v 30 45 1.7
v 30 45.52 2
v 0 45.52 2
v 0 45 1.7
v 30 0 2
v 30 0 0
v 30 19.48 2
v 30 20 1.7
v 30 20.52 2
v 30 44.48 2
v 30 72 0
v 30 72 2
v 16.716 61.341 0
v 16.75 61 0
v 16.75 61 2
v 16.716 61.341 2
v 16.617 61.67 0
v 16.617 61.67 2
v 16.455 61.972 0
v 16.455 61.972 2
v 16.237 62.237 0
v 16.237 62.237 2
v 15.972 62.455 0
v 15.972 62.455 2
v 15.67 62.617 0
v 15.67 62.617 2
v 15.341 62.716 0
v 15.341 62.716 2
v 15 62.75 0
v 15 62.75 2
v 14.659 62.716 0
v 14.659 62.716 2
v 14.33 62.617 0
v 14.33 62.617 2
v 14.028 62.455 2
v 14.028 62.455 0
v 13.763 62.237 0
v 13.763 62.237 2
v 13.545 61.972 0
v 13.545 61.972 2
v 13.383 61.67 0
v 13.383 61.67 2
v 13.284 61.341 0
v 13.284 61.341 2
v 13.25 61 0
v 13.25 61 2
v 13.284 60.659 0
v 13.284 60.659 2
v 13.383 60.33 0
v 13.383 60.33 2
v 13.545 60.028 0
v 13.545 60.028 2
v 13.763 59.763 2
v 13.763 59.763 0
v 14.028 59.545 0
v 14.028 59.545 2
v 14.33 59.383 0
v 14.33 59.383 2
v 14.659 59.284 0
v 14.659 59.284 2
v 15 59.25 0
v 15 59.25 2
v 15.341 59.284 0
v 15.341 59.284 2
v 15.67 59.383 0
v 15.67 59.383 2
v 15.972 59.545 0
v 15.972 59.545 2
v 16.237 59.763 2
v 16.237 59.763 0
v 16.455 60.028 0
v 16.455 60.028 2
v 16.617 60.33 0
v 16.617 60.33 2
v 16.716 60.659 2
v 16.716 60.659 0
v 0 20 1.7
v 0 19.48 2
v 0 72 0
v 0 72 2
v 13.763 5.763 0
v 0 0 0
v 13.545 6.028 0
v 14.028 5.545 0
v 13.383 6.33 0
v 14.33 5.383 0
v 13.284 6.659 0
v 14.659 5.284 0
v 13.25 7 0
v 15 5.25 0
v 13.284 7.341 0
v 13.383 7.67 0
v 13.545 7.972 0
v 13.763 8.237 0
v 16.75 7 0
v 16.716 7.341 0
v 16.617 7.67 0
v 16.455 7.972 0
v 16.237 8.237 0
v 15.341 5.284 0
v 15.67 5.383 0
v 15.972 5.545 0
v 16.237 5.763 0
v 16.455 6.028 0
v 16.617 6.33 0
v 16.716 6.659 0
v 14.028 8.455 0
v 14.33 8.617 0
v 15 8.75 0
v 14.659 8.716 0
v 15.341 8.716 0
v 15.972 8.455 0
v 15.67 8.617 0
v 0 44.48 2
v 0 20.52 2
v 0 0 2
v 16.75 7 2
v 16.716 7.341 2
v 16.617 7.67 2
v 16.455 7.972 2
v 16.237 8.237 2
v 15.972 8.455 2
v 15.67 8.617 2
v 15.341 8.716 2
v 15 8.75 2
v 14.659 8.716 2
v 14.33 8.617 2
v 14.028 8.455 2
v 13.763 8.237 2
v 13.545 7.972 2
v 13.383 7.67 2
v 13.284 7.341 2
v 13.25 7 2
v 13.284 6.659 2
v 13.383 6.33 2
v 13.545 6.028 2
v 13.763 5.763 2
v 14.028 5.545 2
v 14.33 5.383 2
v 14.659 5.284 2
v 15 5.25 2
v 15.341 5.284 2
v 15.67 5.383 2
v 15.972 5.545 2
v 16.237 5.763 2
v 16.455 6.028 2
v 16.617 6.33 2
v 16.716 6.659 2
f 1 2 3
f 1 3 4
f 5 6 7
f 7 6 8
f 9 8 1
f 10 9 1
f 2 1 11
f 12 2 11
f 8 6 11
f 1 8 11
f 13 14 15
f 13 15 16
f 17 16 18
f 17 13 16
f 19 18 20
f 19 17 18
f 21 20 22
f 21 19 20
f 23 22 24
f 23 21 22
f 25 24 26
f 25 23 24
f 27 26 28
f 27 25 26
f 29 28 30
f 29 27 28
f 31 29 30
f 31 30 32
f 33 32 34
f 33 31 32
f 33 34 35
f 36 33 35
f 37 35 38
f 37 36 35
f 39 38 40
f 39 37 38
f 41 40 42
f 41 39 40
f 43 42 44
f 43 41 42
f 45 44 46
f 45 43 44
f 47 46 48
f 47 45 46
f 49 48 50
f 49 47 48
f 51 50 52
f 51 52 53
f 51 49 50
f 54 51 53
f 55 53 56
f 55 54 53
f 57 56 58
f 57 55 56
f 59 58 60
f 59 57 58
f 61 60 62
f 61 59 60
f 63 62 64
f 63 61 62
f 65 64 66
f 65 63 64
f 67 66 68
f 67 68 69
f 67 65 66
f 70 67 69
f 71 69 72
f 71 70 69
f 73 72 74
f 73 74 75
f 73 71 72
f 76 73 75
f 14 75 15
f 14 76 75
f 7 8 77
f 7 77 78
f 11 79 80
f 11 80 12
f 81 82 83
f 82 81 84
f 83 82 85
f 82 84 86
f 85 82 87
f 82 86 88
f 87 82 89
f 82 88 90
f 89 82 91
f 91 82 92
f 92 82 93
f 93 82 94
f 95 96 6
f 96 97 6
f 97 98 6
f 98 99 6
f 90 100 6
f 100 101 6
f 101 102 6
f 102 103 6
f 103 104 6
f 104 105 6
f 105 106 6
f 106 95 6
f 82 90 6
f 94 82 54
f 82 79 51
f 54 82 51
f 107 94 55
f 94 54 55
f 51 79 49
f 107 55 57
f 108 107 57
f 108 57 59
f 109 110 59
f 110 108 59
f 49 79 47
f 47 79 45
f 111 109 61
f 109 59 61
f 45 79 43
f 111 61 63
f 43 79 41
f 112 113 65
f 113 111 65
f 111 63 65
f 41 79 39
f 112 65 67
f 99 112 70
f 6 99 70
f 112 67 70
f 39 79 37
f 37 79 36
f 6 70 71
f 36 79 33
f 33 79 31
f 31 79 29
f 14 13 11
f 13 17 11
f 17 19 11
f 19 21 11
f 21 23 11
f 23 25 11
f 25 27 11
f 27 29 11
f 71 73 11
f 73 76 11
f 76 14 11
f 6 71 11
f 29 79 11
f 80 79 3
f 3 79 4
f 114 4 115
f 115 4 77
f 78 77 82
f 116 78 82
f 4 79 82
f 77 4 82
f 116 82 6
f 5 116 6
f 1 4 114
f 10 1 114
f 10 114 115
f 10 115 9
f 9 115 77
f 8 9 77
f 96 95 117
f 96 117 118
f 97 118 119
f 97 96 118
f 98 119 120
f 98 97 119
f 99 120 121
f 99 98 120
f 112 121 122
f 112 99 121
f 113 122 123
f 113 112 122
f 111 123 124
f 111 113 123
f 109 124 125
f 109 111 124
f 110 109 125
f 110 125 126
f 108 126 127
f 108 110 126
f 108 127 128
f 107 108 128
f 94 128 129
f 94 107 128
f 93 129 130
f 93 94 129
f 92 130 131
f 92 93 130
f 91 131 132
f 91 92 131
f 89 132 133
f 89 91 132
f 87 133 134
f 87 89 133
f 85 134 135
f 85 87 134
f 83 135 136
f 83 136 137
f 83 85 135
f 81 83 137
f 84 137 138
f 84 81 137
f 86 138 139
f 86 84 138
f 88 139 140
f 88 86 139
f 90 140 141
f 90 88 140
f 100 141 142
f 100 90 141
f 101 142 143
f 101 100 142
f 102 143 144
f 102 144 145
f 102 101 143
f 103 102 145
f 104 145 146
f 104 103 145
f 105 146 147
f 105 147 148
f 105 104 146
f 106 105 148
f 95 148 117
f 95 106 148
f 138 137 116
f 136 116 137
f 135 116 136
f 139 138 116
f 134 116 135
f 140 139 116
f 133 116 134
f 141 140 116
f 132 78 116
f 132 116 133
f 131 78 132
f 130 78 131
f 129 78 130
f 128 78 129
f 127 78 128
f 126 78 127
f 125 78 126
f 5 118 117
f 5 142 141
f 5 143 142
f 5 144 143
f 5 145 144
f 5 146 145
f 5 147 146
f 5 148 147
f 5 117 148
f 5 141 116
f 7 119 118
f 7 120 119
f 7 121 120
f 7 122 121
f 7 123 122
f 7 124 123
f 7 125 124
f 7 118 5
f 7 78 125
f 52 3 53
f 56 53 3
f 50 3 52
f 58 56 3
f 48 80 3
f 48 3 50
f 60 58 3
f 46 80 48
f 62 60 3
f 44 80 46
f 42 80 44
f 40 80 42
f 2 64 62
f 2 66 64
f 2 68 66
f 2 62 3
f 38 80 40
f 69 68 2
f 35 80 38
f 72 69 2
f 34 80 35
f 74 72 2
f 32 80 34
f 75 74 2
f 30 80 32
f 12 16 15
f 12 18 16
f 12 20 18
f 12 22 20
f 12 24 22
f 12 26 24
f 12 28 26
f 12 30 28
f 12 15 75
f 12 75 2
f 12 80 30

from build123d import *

# Parameters (mm, degrees)
F0_W     = 30
F0_H     = 27
F0_R     = 1.75
F0_H_2   = 25
F0_H_3   = 20
F1_DEPTH = 2
F3_DEPTH = 30.001


with BuildPart() as f1:
    # F0 (on Top) → F1 (new body)
    with BuildSketch(Plane.XY):
        with Locations((15, 58.5)):
            Rectangle(F0_W, F0_H)
        with Locations((15, 61)):
            Circle(F0_R, mode=Mode.SUBTRACT)
        with Locations((15, 32.5)):
            Rectangle(F0_W, F0_H_2)
        with Locations((15, 10)):
            Rectangle(F0_W, F0_H_3)
        with Locations((15, 7)):
            Circle(F0_R, mode=Mode.SUBTRACT)
    extrude(amount=F1_DEPTH)

    # F2 (on face) → F3 (cut, through all)
    with BuildSketch(Plane(origin=(0, 0, 0), x_dir=(0, -1, 0), z_dir=(-1, 0, 0))):
        Polygon((-20, 1.7), (-19.480385, 2), (-20.519615, 2), align=None)
        Polygon((-44.480385, 2), (-45.519615, 2), (-45, 1.7), align=None)
    extrude(amount=-F3_DEPTH, mode=Mode.SUBTRACT)


solid = f1.part
